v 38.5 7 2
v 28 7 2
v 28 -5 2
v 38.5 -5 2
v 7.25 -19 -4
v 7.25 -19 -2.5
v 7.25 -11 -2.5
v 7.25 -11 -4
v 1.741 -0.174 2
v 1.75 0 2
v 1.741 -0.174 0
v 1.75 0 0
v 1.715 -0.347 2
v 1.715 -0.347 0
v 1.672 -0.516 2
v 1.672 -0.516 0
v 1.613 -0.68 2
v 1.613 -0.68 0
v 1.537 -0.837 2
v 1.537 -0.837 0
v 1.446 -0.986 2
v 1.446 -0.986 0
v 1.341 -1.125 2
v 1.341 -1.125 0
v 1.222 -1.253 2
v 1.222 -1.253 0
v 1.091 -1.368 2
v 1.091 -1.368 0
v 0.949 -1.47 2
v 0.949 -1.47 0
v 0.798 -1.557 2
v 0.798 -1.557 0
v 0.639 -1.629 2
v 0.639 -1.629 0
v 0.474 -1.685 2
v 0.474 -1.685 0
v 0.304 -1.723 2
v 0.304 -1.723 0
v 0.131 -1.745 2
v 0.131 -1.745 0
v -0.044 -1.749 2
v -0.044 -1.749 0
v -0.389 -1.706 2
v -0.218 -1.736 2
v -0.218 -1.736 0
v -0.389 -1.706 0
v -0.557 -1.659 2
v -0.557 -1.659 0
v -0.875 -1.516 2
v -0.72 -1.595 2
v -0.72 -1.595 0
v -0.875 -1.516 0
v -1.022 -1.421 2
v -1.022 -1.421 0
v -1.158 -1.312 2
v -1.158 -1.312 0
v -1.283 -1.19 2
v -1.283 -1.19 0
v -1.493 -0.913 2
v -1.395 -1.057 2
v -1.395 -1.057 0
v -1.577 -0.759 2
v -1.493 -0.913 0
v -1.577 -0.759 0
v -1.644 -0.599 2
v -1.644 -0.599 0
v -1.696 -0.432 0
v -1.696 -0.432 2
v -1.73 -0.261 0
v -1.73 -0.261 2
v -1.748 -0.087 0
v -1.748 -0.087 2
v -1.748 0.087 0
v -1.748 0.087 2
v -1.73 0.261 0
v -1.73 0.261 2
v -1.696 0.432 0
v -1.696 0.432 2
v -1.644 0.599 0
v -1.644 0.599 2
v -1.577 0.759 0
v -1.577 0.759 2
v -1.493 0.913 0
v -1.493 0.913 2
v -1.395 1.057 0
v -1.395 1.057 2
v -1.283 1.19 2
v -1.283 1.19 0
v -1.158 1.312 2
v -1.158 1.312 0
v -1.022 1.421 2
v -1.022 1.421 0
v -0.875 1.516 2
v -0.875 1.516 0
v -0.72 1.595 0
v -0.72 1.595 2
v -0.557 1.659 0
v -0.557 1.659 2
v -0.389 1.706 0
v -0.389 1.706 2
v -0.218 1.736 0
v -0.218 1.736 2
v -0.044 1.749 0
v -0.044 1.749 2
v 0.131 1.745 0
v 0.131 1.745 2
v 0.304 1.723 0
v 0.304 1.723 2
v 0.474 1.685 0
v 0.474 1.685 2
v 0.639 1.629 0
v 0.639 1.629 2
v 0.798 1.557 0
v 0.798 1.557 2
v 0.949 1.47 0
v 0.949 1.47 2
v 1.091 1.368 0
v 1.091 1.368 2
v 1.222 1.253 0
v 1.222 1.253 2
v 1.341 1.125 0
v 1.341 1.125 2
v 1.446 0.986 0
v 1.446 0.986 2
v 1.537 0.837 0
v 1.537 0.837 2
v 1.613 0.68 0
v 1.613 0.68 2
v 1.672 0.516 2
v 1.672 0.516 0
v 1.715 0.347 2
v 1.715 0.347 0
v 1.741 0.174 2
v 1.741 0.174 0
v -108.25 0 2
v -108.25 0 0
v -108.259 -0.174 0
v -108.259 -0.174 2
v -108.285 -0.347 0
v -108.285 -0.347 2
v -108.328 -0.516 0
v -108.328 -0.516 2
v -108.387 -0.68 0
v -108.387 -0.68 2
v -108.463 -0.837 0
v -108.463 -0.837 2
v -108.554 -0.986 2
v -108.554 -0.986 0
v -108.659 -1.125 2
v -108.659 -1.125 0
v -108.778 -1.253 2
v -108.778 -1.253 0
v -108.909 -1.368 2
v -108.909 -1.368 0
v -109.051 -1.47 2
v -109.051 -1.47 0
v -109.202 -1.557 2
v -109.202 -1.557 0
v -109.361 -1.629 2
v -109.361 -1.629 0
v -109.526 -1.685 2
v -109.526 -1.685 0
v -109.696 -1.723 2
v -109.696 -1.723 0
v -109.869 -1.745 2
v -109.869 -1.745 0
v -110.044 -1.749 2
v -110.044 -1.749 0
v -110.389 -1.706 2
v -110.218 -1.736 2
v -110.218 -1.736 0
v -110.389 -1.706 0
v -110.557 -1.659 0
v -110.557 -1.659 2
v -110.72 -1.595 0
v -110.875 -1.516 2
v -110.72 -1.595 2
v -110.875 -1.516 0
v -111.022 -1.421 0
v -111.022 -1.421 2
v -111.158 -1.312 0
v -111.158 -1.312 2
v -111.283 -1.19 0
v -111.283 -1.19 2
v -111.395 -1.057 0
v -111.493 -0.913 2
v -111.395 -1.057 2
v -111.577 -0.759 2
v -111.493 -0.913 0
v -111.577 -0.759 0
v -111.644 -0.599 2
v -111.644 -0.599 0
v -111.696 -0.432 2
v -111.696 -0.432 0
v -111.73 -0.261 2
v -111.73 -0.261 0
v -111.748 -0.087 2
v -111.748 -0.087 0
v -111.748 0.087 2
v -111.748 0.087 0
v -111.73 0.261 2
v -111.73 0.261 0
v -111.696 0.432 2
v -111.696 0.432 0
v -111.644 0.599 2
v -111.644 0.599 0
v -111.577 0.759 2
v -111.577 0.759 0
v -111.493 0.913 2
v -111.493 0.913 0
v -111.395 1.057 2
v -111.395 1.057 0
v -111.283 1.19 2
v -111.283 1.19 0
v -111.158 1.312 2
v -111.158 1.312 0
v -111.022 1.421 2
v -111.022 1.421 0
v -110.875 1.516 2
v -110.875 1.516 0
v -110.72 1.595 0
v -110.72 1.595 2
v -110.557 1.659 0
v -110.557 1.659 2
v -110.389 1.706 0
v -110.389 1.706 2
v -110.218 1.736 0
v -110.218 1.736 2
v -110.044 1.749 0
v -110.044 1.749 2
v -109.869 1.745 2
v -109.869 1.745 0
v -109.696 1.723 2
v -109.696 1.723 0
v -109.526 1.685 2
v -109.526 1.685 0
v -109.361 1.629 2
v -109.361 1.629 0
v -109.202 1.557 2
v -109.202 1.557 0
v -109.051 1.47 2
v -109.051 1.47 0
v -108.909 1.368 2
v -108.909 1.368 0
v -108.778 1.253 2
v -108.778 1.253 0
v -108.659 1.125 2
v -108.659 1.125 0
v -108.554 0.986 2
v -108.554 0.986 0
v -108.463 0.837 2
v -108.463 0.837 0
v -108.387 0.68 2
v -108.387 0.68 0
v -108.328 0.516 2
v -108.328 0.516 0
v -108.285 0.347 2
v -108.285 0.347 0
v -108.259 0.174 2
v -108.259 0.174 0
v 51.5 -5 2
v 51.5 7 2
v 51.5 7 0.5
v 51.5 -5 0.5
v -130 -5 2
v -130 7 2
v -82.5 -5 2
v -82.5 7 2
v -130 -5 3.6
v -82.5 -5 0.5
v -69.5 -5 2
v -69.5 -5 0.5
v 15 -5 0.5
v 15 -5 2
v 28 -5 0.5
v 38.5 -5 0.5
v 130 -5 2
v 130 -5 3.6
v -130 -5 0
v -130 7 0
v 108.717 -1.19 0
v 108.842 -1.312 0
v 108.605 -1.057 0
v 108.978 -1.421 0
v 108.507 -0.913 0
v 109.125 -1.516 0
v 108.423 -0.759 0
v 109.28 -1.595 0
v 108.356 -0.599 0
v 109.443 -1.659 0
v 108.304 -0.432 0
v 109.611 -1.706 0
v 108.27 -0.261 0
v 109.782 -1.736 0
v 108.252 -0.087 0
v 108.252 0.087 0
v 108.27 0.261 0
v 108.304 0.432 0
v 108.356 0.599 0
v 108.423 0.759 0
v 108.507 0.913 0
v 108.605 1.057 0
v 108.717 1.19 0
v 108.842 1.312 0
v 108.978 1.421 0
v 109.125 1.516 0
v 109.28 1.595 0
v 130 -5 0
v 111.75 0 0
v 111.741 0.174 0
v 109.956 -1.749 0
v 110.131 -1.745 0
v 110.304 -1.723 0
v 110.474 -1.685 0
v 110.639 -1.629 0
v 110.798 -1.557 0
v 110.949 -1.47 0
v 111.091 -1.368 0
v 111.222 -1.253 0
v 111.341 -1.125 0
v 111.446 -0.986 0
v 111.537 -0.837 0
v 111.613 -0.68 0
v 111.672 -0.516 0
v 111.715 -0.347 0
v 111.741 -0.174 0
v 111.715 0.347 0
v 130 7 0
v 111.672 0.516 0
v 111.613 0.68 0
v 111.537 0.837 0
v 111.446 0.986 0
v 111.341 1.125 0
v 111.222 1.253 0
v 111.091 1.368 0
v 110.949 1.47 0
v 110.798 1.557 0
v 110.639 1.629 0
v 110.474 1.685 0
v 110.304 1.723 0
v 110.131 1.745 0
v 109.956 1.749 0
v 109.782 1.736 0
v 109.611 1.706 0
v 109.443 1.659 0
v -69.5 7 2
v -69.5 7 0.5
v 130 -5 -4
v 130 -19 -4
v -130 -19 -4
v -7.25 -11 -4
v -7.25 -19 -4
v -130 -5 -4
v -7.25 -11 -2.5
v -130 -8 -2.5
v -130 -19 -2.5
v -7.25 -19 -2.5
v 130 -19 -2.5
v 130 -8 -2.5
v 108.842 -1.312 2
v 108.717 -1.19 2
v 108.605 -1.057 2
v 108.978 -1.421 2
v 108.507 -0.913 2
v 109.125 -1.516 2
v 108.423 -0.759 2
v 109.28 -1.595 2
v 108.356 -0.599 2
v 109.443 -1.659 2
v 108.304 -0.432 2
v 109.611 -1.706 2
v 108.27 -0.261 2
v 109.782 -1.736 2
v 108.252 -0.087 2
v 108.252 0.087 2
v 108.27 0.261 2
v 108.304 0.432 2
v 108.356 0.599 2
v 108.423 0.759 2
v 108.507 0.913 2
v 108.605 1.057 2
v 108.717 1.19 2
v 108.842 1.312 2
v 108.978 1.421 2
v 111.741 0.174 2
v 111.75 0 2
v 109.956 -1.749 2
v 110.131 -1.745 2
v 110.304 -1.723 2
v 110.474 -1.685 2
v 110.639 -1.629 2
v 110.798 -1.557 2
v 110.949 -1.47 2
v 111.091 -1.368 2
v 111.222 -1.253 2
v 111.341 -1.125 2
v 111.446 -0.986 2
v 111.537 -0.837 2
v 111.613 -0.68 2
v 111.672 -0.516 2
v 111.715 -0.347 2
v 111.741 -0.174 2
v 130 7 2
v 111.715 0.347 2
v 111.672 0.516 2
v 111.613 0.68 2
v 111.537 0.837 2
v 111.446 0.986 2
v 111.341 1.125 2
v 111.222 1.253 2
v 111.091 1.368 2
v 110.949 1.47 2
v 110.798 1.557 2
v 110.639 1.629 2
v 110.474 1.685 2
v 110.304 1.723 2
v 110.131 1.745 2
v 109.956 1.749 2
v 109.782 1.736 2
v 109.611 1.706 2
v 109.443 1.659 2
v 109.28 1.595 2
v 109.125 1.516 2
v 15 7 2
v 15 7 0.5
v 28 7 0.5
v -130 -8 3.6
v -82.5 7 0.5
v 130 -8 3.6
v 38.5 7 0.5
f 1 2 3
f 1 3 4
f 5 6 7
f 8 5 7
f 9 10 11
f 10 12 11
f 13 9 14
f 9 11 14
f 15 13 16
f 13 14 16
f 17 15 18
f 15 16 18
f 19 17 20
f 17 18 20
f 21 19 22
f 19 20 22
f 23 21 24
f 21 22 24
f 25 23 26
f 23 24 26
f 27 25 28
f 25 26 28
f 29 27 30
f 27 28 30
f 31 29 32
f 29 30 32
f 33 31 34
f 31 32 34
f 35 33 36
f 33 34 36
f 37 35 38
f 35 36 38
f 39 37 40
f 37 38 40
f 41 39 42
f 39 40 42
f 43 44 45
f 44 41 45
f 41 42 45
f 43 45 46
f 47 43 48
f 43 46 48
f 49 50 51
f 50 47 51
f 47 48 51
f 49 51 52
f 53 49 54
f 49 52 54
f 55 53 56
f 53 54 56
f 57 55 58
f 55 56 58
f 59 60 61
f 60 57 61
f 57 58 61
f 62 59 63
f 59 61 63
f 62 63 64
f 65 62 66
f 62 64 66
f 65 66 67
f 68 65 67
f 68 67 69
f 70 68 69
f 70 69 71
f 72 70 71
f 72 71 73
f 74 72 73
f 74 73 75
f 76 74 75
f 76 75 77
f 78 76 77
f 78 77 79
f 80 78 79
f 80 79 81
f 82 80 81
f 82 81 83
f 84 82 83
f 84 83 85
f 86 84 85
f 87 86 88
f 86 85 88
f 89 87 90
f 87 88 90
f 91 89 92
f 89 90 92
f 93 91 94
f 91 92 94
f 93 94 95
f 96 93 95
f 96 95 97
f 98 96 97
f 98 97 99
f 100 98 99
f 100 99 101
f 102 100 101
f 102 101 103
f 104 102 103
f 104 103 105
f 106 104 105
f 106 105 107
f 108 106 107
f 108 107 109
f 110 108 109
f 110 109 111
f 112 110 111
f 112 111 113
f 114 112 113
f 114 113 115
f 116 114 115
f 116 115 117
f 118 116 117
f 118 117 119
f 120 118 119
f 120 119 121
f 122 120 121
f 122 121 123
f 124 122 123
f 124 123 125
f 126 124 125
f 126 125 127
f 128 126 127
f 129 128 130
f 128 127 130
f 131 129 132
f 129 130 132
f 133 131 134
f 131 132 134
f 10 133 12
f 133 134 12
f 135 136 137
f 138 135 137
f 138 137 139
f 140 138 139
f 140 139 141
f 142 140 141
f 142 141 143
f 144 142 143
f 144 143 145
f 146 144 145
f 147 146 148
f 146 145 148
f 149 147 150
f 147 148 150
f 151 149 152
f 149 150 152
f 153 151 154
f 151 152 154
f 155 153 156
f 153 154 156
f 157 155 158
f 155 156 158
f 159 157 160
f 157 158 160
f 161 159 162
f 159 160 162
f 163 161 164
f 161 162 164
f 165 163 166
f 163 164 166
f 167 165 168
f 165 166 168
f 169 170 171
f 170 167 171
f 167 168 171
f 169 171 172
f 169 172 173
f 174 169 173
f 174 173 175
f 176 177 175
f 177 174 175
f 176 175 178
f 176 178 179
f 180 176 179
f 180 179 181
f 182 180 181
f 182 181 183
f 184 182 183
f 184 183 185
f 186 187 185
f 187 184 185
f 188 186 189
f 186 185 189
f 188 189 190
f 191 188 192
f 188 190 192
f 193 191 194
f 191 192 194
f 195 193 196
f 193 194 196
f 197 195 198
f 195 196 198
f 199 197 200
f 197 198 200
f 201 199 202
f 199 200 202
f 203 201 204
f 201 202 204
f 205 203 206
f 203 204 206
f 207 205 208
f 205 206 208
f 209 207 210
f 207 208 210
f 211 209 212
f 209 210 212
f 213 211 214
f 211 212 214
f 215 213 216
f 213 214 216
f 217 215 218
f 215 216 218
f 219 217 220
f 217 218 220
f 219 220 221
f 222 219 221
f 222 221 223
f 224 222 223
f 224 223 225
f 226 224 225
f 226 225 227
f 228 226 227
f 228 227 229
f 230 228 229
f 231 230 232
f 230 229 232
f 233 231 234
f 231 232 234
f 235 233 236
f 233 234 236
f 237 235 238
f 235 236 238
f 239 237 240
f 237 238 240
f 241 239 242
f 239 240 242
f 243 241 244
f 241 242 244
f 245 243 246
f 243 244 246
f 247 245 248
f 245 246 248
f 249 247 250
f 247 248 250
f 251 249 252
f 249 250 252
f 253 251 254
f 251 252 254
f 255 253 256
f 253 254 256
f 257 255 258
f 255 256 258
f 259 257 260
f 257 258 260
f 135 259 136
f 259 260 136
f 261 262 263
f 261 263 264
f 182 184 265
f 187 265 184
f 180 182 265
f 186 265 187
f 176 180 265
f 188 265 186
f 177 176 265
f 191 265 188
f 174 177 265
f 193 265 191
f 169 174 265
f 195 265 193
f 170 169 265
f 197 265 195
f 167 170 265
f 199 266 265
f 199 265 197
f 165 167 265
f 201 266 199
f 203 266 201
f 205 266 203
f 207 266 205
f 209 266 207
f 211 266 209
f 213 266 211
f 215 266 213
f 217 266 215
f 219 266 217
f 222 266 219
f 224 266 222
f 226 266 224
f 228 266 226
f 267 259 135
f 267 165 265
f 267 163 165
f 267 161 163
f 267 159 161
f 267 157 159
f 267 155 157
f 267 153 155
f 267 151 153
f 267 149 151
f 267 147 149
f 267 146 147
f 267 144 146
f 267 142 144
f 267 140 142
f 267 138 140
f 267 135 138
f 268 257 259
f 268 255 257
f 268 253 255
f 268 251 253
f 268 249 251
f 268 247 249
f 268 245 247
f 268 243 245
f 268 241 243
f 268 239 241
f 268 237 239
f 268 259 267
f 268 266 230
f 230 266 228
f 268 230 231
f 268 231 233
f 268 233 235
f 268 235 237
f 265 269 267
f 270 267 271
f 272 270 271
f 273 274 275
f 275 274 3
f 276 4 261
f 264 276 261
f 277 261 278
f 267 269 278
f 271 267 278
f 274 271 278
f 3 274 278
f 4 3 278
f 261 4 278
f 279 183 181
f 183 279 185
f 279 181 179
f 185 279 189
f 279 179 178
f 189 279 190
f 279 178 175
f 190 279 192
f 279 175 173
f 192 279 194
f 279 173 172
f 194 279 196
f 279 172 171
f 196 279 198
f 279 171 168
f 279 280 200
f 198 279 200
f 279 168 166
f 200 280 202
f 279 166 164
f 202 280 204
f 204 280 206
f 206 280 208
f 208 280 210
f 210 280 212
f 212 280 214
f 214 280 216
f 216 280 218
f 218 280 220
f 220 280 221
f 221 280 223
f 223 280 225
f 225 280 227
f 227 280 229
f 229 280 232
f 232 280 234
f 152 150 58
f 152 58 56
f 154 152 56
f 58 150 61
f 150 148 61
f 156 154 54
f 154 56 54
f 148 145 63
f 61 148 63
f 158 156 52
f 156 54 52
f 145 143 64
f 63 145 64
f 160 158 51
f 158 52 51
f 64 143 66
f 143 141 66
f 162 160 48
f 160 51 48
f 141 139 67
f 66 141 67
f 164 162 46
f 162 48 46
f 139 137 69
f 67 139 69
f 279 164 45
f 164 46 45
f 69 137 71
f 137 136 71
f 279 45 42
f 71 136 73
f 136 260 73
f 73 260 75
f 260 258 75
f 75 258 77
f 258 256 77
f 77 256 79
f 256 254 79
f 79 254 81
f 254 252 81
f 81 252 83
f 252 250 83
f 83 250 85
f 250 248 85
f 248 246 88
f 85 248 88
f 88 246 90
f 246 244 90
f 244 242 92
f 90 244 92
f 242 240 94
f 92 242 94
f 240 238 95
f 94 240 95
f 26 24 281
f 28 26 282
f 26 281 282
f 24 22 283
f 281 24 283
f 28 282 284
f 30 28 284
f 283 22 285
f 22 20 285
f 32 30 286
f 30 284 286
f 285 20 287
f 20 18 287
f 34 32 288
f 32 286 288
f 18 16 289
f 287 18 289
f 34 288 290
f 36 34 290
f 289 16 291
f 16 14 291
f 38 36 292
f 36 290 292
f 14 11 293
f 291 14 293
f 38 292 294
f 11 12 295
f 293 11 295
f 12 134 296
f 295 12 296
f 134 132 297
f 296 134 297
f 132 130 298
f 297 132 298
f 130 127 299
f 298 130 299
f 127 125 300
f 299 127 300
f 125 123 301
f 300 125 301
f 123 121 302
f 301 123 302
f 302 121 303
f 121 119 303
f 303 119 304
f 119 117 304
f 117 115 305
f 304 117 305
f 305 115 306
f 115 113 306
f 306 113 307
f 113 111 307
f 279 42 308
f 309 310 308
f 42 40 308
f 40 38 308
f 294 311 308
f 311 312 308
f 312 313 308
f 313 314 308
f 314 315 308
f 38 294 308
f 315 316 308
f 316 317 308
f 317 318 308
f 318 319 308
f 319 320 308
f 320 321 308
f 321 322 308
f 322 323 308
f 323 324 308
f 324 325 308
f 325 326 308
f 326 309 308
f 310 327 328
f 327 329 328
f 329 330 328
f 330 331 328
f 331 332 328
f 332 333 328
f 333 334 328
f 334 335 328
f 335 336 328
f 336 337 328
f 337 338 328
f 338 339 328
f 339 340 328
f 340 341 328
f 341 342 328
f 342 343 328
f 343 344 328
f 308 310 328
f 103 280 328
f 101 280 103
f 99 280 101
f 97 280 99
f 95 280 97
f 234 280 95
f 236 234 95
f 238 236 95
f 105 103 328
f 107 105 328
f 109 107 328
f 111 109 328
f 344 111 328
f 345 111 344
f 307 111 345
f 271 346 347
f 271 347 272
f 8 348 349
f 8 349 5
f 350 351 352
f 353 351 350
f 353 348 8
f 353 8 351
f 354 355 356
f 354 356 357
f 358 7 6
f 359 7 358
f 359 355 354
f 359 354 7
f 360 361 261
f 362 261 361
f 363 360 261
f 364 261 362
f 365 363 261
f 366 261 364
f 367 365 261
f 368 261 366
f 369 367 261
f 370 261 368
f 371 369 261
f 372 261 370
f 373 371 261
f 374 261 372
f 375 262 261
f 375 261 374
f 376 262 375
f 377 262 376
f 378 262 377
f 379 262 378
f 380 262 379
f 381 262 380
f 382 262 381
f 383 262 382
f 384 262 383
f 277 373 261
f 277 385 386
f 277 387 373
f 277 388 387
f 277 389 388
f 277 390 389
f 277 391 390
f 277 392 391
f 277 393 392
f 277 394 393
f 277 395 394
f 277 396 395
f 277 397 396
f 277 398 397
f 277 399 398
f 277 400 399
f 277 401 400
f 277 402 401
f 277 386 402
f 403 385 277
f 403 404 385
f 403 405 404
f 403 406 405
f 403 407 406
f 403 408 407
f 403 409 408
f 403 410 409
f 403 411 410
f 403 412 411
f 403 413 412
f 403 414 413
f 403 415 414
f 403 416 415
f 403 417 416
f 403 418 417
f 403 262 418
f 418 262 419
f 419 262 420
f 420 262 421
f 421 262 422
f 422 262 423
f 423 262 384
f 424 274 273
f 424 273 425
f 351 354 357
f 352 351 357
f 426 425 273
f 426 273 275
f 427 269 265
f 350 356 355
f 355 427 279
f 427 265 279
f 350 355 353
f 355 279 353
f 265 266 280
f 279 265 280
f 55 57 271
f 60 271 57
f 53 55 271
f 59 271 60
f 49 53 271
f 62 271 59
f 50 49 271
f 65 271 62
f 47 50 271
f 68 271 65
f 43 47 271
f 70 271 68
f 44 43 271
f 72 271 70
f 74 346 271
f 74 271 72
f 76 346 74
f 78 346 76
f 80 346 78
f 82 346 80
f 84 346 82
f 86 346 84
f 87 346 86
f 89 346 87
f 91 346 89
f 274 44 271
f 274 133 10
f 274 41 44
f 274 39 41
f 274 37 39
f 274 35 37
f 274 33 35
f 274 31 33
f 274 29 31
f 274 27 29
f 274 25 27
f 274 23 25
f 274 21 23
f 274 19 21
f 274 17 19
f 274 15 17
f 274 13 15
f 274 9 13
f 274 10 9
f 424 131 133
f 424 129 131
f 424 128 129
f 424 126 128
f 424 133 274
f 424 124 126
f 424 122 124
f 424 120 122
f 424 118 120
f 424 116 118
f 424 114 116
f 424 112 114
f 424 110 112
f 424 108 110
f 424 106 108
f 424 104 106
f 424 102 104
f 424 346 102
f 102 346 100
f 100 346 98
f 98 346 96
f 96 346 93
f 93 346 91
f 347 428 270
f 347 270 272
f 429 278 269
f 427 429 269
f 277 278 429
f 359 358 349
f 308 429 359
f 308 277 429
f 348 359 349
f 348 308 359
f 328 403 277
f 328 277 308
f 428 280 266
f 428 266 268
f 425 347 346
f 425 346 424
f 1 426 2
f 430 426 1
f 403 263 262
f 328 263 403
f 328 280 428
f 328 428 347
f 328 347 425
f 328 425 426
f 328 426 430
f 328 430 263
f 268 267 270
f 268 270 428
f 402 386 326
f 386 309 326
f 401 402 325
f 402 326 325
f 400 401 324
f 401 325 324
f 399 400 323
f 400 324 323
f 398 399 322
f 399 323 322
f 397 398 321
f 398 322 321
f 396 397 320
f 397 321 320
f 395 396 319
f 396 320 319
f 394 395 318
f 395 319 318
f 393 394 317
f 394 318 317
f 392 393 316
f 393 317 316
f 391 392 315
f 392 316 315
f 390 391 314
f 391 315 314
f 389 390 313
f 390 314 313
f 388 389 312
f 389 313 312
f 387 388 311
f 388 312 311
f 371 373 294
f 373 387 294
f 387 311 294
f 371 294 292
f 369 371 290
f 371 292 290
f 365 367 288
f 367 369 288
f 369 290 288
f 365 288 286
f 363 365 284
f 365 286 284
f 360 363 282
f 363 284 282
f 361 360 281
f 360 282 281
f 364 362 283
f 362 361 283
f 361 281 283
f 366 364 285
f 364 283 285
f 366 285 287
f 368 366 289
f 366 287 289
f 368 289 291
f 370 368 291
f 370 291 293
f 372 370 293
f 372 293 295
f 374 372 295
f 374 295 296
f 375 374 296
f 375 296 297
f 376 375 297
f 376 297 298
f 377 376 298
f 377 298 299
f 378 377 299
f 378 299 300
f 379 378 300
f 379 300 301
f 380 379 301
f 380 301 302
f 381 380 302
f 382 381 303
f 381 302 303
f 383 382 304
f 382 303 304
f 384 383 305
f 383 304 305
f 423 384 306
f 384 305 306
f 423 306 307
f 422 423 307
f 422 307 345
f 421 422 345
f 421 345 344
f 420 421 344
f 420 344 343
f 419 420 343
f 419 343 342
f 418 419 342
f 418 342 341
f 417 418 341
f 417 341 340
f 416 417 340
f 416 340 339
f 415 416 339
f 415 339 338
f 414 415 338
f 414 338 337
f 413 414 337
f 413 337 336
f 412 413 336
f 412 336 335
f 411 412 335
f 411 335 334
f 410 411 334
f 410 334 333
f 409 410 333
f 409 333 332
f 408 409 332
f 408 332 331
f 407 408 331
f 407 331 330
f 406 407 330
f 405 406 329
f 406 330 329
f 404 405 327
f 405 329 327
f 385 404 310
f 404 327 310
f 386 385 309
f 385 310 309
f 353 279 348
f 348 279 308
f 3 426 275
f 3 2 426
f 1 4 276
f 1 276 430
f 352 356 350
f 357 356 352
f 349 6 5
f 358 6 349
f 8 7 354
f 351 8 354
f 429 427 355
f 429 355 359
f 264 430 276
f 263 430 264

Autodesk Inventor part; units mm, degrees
ref_plane "YZ Plane" through (0, 0, 0) normal (1, 0, 0) x (0, 1, 0)
ref_plane "XZ Plane" through (0, 0, 0) normal (0, 1, 0) x (-1, 0, 0)
ref_plane "XY Plane" through (0, 0, 0) normal (0, 0, 1) x (1, 0, 0)
sketch "Sketch1" plane through (0, 0, 0) normal (0, 0, 1) x (1, 0, 0)
  circle A0 centre (0, 0) radius 1.75
  circle A1 centre (110, 0) radius 1.75
  circle A2 centre (-110, 0) radius 1.75
  line L0 (-130, 7) -> (130, 7)
  line L1 (130, 7) -> (130, -5)
  line L2 (130, -5) -> (-130, -5)
  line L3 (-130, -5) -> (-130, 7)
  dimension "d0" = 3.5
  dimension "d1" = 110
  dimension "d2" = 110
  dimension "d3" = 130
  dimension "d4" = 130
  dimension "d5" = 7
  dimension "d6" = 5
extrude "Extrusion1" add sketch "Sketch1" along normal blind 2
sketch "Sketch2" plane through (-130, -5, 0) normal (0, -1, 0) x (1, 0, 0)
  line L0 (0, 0) -> (260, 0) projected
  line L1 (0, 0) -> (260, 0)
  line L2 (260, 0) -> (260, 3.6)
  line L3 (260, 3.6) -> (0, 3.6)
  line L4 (0, 3.6) -> (0, 0)
  line L5 (260, 0) -> (260, 2) projected
  line L6 (0, 2) -> (260, 2) projected
  point P0 (130, 0)
  dimension "d9" = 1.6
extrude "Extrusion2" add sketch "Sketch2" along normal blind 3
sketch "Sketch3" plane through (0, 0, 0) normal (0, 0, -1) x (-1, 0, 0)
  line L0 (130, -5) -> (-130, -5) projected
  line L1 (130, -5) -> (130, -8) projected
  line L2 (130, -5) -> (130, -8)
  line L3 (130, -8) -> (-130, -8)
  line L4 (-130, -8) -> (-130, -5)
  point P0 (0, 0)
extrude "Extrusion3" add sketch "Sketch3" along normal blind 4
sketch "Sketch4" plane through (-130, -8, 0) normal (0, -1, 0) x (1, 0, 0)
  line L0 (260, -4) -> (0, -4) projected
  line L1 (0, 0) -> (0, -4) projected
  line L2 (0, -4) -> (0, -2.5)
  line L3 (0, -2.5) -> (260, -2.5)
  line L4 (260, 0) -> (260, -4) projected
  line L5 (260, -2.5) -> (260, -4)
  point P0 (130, 0)
  dimension "d14" = 1.5
extrude "Extrusion4" add sketch "Sketch4" along normal blind 11
sketch "Sketch5" plane through (0, 0, 2) normal (0, 0, 1) x (1, 0, 0)
  line L0 (130, 7) -> (-130, 7) projected
  line L1 (-82.5, 7) -> (-69.5, 7)
  line L2 (-69.5, 7) -> (-69.5, -5)
  line L3 (-69.5, -5) -> (-82.5, -5)
  line L4 (-82.5, -5) -> (-82.5, 7)
  line L5 (15, 7) -> (28, 7)
  line L6 (28, 7) -> (28, -5)
  line L7 (28, -5) -> (15, -5)
  line L8 (15, -5) -> (15, 7)
  line L9 (38.5, 7) -> (51.5, 7)
  line L10 (51.5, 7) -> (51.5, -5)
  line L11 (51.5, -5) -> (38.5, -5)
  line L12 (38.5, -5) -> (38.5, 7)
  line L13 (-130, -5) -> (130, -5) projected
  point P0 (0, 0)
  point P1 (-76, -5)
  point P2 (21.5, -5)
  point P3 (45, -5)
  dimension "d17" = 13
  dimension "d19" = 76
  dimension "d20" = 21.5
  dimension "d21" = 45
extrude "Extrusion5" cut sketch "Sketch5" against normal blind 1.5 contours L10 L11 L12 L0 | L6 L7 L8 L0 | L2 L3 L4 L0
sketch "Sketch6" plane through (-130, -8, -2.5) normal (0, 0, 1) x (1, 0, 0)
  circle A0 centre (130, 8) radius 1.75 construction
  line L0 (130, 8) -> (130, -11) construction
  line L1 (1, -11) -> (259, -11) construction
  line L2 (122.75, -11) -> (137.25, -11)
  line L3 (137.25, -11) -> (137.25, -3)
  line L4 (137.25, -3) -> (122.75, -3)
  line L5 (122.75, -3) -> (122.75, -11)
  point P0 (130, -3)
  dimension "d25" = 14.5
  dimension "d26" = 8
extrude "Extrusion6" cut sketch "Sketch6" against normal up to surface (1.5 mm away)
equation "\"d2\" = d1"
equation "\"d4\" = d3"
properties part number "Lower mount"
